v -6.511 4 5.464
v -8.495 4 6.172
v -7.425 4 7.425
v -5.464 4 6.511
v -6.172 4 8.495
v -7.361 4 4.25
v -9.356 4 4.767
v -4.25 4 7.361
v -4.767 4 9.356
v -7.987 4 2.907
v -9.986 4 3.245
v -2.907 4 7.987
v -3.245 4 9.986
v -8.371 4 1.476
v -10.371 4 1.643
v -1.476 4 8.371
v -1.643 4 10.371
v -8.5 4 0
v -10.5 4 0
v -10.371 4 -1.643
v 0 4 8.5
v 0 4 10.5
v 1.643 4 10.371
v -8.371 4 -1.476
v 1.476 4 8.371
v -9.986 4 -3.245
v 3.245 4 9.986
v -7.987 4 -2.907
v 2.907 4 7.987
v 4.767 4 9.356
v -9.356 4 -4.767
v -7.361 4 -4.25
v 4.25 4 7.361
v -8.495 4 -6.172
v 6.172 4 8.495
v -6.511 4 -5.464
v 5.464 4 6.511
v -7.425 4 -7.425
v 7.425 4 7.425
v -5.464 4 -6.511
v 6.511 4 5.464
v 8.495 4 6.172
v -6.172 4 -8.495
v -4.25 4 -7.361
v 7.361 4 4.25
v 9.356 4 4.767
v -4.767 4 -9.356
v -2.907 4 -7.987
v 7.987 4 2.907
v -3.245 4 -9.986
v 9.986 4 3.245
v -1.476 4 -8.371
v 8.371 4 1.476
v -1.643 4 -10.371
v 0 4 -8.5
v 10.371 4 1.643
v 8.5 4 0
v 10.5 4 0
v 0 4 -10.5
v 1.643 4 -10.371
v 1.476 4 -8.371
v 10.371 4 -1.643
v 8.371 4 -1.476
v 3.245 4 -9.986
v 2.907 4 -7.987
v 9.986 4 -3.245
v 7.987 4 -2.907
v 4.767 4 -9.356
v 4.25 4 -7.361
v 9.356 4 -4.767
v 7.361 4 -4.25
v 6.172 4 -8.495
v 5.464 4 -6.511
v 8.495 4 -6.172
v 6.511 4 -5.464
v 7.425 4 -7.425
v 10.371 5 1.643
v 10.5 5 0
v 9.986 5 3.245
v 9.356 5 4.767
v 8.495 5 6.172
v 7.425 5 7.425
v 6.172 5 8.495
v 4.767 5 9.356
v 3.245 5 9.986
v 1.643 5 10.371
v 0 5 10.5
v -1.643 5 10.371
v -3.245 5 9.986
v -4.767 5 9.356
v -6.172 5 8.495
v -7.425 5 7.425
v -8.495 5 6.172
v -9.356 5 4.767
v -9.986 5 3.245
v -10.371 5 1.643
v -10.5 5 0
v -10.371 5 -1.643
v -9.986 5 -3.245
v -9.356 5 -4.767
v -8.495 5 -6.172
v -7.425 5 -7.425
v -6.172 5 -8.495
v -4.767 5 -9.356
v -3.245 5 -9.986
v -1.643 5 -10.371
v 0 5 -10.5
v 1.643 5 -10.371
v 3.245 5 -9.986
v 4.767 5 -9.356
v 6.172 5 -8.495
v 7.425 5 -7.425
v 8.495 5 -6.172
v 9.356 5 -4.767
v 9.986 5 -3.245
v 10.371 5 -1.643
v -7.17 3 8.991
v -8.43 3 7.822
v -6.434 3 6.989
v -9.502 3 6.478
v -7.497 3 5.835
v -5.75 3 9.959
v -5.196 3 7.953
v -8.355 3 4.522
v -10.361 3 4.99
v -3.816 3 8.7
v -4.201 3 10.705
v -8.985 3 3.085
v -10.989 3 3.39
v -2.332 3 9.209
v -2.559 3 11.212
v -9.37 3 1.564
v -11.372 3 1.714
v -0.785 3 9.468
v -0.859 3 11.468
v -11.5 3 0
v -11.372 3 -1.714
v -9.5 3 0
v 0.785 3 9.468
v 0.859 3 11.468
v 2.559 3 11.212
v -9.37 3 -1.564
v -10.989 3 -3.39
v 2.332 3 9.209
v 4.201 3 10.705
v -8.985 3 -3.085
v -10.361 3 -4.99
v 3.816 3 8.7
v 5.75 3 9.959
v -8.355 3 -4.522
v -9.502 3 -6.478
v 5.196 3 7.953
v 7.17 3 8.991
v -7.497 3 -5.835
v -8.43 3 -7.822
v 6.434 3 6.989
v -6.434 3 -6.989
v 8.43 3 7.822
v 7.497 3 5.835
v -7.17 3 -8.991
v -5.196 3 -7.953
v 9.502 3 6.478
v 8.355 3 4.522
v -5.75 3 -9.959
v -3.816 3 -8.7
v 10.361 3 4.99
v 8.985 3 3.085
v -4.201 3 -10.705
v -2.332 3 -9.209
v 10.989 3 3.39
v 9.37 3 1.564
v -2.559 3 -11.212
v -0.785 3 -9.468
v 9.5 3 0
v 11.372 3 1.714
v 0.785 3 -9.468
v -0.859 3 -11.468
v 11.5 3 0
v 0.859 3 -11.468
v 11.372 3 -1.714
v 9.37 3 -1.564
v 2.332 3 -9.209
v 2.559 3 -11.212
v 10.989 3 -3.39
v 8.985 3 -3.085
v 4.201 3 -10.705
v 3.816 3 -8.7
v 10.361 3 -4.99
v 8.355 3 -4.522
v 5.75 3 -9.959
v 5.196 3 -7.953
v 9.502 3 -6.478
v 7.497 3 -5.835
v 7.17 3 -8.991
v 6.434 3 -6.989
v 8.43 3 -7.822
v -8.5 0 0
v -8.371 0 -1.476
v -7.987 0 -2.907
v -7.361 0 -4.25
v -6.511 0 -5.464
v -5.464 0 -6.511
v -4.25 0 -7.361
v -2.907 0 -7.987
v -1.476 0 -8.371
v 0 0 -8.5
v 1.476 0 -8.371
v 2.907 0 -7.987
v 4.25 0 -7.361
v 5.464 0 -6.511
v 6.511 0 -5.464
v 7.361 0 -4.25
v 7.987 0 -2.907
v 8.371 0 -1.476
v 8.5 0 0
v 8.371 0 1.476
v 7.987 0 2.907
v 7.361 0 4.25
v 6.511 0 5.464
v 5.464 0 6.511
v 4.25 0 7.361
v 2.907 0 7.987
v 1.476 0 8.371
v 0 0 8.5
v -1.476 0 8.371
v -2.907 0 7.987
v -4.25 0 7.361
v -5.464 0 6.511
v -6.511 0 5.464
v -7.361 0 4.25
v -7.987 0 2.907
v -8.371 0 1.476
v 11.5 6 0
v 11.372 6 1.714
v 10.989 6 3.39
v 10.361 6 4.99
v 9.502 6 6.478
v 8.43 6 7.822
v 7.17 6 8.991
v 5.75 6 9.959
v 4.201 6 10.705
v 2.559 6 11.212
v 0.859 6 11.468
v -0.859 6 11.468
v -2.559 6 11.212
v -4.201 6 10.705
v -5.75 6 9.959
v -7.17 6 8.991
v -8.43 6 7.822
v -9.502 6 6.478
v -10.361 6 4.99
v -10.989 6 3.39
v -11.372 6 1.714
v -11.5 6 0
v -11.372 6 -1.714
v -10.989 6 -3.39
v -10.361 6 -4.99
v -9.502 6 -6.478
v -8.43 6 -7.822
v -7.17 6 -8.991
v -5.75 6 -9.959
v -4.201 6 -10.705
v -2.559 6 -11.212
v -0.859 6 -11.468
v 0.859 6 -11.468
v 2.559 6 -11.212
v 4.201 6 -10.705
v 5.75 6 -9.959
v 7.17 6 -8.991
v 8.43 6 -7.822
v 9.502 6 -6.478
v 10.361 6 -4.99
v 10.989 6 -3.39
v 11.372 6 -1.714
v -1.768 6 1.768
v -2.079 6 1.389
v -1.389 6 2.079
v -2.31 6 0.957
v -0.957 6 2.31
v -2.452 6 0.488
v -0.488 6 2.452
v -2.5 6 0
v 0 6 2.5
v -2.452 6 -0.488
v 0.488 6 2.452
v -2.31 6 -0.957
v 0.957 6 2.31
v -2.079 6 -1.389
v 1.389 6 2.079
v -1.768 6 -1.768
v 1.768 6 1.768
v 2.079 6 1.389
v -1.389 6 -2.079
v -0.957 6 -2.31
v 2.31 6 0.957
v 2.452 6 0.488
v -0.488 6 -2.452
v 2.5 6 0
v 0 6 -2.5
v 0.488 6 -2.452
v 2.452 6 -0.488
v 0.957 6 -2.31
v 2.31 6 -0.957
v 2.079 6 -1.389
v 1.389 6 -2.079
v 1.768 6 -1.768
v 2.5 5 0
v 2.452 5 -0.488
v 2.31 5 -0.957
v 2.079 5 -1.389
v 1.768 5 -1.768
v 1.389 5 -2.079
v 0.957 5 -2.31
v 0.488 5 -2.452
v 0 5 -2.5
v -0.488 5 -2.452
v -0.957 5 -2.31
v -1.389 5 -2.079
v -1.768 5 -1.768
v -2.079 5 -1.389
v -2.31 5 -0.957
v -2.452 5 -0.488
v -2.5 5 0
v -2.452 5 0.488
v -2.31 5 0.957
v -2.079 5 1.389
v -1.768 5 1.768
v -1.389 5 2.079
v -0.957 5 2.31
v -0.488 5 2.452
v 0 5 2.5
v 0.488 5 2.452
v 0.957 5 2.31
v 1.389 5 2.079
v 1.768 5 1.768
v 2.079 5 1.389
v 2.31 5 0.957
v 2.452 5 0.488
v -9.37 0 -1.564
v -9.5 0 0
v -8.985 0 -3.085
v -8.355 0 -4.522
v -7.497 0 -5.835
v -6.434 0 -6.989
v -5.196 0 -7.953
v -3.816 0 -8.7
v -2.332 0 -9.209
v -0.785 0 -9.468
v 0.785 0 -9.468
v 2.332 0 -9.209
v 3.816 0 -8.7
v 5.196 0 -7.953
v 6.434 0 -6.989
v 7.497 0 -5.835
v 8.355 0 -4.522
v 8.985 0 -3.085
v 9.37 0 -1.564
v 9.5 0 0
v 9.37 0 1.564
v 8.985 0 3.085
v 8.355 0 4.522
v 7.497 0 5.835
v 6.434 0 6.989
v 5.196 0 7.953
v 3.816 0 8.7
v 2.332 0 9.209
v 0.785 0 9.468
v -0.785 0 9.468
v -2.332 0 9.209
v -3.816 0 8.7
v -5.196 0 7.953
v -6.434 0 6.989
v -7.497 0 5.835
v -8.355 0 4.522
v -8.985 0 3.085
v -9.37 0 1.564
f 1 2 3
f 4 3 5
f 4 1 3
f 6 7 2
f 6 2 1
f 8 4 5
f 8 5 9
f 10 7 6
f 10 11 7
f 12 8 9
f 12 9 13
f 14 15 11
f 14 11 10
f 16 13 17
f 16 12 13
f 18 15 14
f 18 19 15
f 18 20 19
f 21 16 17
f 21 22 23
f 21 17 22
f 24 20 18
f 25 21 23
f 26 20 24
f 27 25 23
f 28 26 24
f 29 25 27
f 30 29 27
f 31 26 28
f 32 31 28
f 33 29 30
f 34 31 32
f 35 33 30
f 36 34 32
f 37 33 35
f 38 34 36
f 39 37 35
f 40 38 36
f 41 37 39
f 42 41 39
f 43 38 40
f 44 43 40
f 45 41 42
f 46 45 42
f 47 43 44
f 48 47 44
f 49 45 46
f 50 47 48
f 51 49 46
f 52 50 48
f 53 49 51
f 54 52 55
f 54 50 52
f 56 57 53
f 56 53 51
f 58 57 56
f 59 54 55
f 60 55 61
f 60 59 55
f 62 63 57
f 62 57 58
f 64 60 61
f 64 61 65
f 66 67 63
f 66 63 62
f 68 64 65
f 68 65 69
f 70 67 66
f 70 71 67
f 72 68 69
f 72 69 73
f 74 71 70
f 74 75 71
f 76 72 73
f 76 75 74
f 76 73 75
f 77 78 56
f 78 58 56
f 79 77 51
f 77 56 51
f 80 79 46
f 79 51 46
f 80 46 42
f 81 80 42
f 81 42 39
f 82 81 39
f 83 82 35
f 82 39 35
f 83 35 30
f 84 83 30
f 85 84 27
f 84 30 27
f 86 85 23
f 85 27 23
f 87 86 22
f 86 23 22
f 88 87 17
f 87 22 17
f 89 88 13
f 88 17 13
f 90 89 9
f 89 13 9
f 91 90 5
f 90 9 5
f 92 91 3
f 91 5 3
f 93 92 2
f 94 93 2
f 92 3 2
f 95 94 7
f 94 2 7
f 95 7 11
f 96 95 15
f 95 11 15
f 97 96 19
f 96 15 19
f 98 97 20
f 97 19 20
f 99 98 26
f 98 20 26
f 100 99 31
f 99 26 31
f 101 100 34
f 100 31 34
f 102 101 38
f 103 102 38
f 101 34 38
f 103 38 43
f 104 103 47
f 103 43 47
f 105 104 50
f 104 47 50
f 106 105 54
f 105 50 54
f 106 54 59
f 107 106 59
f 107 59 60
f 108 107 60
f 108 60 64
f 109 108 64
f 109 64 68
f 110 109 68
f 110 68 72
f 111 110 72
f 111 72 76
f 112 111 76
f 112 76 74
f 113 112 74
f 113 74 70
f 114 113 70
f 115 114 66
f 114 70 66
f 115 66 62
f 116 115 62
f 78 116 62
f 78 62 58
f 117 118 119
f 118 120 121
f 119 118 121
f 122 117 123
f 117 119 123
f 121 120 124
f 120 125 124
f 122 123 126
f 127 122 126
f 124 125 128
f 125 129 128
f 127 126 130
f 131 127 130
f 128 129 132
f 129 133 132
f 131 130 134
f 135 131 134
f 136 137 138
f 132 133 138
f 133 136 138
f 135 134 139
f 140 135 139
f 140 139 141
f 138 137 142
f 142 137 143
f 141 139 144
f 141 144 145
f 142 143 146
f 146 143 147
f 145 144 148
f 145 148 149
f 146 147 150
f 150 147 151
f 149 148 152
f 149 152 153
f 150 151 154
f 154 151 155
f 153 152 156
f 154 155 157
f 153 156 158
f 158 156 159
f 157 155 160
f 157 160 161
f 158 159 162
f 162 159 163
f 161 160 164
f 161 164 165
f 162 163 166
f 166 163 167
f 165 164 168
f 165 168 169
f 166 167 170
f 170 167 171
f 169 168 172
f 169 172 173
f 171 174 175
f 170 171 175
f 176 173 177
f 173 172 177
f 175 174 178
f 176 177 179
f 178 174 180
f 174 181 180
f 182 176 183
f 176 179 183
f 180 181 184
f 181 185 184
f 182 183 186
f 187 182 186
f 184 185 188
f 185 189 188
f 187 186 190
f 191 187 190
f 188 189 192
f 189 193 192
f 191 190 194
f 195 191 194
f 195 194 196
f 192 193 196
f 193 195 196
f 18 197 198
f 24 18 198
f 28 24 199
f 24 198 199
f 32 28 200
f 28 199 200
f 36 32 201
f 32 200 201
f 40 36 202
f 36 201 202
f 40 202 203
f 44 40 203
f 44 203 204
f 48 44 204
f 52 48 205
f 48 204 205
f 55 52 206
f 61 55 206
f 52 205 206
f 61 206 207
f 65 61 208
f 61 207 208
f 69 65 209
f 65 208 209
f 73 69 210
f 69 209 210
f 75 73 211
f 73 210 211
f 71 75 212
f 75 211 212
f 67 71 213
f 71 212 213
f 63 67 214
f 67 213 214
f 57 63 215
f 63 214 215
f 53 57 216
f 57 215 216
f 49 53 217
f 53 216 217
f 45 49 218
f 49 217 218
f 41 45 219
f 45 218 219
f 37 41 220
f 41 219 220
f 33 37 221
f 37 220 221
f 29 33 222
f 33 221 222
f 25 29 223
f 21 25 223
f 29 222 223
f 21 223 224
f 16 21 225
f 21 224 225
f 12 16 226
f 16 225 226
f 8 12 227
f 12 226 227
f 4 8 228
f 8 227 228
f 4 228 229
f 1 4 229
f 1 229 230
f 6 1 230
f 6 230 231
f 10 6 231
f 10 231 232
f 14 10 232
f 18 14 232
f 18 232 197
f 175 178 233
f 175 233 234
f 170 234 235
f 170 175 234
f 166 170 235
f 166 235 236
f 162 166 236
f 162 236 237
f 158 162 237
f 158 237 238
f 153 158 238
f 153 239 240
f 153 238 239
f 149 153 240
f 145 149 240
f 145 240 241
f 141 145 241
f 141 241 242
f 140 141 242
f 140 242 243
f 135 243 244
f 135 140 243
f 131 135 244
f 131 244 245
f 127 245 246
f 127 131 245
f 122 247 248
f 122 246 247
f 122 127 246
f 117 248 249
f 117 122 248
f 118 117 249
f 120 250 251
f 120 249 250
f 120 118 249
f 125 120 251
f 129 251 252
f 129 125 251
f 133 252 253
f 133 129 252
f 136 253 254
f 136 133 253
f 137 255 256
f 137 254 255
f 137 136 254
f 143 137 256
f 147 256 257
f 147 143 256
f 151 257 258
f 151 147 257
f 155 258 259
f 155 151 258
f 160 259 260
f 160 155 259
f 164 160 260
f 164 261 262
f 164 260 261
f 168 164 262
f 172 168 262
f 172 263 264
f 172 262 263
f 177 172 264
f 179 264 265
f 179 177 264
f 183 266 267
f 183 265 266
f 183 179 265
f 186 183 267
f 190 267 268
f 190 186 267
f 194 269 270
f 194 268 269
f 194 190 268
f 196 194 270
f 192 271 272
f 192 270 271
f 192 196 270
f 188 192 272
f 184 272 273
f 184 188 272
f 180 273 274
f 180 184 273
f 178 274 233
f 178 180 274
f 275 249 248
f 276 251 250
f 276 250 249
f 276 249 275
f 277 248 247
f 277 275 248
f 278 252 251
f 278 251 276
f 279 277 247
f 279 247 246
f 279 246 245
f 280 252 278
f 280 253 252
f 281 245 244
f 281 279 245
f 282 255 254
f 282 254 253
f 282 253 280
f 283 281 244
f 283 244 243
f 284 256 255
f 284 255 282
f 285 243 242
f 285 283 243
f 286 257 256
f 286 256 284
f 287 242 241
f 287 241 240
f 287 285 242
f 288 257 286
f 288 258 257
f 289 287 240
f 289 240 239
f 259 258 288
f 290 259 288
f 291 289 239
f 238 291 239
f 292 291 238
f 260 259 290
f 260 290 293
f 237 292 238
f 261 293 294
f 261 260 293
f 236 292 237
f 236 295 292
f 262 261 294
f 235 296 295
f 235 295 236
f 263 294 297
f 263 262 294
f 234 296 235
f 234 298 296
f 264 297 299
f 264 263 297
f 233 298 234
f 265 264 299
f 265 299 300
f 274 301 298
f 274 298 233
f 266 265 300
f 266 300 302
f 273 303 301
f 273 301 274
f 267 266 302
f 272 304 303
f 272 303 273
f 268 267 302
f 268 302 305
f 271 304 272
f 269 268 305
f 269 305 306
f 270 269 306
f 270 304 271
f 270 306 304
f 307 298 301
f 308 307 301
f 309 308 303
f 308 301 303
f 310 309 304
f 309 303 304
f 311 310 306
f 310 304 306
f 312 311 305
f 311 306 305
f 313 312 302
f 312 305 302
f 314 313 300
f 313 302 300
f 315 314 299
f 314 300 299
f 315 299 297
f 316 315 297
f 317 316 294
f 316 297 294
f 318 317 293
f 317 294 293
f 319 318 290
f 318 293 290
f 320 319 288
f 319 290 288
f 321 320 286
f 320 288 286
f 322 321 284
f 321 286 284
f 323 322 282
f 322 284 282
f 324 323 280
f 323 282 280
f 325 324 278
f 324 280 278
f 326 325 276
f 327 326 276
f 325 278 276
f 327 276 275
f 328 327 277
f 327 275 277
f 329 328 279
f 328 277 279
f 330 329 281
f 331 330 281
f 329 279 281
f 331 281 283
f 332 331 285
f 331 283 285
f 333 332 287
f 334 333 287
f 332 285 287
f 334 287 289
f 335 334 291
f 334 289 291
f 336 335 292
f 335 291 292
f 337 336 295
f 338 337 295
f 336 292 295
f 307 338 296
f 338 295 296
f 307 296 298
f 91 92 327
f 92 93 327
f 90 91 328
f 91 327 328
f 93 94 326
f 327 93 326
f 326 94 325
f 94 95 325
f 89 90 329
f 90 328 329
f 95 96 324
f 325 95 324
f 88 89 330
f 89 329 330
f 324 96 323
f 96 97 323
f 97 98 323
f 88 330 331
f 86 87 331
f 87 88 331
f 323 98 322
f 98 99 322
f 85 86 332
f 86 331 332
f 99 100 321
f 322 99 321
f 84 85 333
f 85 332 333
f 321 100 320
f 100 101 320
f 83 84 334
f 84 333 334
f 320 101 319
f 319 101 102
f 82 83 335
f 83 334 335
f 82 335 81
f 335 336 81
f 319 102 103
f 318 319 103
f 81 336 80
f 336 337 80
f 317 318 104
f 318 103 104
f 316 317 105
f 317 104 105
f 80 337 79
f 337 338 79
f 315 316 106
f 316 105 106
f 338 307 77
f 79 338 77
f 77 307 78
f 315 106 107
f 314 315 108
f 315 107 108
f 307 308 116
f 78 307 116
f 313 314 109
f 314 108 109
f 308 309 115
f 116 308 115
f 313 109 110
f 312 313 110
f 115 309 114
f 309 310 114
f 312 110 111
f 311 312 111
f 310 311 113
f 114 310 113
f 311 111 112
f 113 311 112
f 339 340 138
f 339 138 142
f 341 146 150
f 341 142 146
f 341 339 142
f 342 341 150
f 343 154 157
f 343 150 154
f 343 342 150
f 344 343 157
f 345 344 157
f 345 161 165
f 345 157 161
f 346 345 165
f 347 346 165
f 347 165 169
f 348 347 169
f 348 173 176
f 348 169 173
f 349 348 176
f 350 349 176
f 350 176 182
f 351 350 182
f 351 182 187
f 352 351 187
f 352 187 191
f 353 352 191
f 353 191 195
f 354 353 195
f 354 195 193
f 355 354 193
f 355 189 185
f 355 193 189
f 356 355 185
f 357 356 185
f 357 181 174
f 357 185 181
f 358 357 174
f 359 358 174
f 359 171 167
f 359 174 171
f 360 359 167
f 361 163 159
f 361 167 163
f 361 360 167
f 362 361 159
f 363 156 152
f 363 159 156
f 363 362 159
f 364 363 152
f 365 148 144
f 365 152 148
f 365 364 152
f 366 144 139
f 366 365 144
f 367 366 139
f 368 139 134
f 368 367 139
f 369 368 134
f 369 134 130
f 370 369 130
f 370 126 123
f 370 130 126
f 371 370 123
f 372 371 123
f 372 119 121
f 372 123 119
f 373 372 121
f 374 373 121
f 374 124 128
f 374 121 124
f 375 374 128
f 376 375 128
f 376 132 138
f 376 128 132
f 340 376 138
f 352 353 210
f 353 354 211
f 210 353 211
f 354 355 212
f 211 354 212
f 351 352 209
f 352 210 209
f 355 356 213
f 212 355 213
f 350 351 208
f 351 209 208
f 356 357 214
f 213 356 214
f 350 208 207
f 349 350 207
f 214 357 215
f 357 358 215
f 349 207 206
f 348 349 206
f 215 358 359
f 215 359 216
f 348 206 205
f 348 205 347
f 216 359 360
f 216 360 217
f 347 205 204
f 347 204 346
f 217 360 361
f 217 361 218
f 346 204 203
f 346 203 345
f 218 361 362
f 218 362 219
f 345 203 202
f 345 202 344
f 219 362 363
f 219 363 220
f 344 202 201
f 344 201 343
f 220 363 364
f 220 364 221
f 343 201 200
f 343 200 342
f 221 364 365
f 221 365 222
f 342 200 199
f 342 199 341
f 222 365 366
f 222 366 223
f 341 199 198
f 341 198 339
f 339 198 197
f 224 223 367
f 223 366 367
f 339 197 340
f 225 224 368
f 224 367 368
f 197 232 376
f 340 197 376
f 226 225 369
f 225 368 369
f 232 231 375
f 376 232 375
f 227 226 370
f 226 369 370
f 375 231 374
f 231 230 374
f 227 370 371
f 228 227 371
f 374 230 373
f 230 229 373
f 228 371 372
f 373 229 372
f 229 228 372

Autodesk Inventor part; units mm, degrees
ref_plane "YZ Plane" through (0, 0, 0) normal (1, 0, 0) x (0, 1, 0)
ref_plane "XZ Plane" through (0, 0, 0) normal (0, 1, 0) x (-1, 0, 0)
ref_plane "XY Plane" through (0, 0, 0) normal (0, 0, 1) x (1, 0, 0)
sketch "Sketch1" plane through (0, 0, 0) normal (0, 1, 0) x (-1, 0, 0)
  circle A0 centre (0, 0) radius 9.5
  dimension "d0" = 19
extrude "Extrusion1" add sketch "Sketch1" along normal blind 3
sketch "Sketch2" plane through (0, 3, 0) normal (0, 1, 0) x (1, 0, 0)
  circle A0 centre (0, 0) radius 11.5
  dimension "d3" = 23
extrude "Extrusion2" add sketch "Sketch2" along normal blind 3
shell "Shell1" thickness 1 removed faces 1 at (2.7119, 0, -0.7138)
sketch "Sketch3" plane through (0, 6, 0) normal (0, 1, 0) x (1, 0, 0)
  circle A0 centre (0, 0) radius 2.5
  dimension "d7" = 5
extrude "Extrusion3" cut sketch "Sketch3" against normal blind 3
properties part number "SwivelPartCap"
